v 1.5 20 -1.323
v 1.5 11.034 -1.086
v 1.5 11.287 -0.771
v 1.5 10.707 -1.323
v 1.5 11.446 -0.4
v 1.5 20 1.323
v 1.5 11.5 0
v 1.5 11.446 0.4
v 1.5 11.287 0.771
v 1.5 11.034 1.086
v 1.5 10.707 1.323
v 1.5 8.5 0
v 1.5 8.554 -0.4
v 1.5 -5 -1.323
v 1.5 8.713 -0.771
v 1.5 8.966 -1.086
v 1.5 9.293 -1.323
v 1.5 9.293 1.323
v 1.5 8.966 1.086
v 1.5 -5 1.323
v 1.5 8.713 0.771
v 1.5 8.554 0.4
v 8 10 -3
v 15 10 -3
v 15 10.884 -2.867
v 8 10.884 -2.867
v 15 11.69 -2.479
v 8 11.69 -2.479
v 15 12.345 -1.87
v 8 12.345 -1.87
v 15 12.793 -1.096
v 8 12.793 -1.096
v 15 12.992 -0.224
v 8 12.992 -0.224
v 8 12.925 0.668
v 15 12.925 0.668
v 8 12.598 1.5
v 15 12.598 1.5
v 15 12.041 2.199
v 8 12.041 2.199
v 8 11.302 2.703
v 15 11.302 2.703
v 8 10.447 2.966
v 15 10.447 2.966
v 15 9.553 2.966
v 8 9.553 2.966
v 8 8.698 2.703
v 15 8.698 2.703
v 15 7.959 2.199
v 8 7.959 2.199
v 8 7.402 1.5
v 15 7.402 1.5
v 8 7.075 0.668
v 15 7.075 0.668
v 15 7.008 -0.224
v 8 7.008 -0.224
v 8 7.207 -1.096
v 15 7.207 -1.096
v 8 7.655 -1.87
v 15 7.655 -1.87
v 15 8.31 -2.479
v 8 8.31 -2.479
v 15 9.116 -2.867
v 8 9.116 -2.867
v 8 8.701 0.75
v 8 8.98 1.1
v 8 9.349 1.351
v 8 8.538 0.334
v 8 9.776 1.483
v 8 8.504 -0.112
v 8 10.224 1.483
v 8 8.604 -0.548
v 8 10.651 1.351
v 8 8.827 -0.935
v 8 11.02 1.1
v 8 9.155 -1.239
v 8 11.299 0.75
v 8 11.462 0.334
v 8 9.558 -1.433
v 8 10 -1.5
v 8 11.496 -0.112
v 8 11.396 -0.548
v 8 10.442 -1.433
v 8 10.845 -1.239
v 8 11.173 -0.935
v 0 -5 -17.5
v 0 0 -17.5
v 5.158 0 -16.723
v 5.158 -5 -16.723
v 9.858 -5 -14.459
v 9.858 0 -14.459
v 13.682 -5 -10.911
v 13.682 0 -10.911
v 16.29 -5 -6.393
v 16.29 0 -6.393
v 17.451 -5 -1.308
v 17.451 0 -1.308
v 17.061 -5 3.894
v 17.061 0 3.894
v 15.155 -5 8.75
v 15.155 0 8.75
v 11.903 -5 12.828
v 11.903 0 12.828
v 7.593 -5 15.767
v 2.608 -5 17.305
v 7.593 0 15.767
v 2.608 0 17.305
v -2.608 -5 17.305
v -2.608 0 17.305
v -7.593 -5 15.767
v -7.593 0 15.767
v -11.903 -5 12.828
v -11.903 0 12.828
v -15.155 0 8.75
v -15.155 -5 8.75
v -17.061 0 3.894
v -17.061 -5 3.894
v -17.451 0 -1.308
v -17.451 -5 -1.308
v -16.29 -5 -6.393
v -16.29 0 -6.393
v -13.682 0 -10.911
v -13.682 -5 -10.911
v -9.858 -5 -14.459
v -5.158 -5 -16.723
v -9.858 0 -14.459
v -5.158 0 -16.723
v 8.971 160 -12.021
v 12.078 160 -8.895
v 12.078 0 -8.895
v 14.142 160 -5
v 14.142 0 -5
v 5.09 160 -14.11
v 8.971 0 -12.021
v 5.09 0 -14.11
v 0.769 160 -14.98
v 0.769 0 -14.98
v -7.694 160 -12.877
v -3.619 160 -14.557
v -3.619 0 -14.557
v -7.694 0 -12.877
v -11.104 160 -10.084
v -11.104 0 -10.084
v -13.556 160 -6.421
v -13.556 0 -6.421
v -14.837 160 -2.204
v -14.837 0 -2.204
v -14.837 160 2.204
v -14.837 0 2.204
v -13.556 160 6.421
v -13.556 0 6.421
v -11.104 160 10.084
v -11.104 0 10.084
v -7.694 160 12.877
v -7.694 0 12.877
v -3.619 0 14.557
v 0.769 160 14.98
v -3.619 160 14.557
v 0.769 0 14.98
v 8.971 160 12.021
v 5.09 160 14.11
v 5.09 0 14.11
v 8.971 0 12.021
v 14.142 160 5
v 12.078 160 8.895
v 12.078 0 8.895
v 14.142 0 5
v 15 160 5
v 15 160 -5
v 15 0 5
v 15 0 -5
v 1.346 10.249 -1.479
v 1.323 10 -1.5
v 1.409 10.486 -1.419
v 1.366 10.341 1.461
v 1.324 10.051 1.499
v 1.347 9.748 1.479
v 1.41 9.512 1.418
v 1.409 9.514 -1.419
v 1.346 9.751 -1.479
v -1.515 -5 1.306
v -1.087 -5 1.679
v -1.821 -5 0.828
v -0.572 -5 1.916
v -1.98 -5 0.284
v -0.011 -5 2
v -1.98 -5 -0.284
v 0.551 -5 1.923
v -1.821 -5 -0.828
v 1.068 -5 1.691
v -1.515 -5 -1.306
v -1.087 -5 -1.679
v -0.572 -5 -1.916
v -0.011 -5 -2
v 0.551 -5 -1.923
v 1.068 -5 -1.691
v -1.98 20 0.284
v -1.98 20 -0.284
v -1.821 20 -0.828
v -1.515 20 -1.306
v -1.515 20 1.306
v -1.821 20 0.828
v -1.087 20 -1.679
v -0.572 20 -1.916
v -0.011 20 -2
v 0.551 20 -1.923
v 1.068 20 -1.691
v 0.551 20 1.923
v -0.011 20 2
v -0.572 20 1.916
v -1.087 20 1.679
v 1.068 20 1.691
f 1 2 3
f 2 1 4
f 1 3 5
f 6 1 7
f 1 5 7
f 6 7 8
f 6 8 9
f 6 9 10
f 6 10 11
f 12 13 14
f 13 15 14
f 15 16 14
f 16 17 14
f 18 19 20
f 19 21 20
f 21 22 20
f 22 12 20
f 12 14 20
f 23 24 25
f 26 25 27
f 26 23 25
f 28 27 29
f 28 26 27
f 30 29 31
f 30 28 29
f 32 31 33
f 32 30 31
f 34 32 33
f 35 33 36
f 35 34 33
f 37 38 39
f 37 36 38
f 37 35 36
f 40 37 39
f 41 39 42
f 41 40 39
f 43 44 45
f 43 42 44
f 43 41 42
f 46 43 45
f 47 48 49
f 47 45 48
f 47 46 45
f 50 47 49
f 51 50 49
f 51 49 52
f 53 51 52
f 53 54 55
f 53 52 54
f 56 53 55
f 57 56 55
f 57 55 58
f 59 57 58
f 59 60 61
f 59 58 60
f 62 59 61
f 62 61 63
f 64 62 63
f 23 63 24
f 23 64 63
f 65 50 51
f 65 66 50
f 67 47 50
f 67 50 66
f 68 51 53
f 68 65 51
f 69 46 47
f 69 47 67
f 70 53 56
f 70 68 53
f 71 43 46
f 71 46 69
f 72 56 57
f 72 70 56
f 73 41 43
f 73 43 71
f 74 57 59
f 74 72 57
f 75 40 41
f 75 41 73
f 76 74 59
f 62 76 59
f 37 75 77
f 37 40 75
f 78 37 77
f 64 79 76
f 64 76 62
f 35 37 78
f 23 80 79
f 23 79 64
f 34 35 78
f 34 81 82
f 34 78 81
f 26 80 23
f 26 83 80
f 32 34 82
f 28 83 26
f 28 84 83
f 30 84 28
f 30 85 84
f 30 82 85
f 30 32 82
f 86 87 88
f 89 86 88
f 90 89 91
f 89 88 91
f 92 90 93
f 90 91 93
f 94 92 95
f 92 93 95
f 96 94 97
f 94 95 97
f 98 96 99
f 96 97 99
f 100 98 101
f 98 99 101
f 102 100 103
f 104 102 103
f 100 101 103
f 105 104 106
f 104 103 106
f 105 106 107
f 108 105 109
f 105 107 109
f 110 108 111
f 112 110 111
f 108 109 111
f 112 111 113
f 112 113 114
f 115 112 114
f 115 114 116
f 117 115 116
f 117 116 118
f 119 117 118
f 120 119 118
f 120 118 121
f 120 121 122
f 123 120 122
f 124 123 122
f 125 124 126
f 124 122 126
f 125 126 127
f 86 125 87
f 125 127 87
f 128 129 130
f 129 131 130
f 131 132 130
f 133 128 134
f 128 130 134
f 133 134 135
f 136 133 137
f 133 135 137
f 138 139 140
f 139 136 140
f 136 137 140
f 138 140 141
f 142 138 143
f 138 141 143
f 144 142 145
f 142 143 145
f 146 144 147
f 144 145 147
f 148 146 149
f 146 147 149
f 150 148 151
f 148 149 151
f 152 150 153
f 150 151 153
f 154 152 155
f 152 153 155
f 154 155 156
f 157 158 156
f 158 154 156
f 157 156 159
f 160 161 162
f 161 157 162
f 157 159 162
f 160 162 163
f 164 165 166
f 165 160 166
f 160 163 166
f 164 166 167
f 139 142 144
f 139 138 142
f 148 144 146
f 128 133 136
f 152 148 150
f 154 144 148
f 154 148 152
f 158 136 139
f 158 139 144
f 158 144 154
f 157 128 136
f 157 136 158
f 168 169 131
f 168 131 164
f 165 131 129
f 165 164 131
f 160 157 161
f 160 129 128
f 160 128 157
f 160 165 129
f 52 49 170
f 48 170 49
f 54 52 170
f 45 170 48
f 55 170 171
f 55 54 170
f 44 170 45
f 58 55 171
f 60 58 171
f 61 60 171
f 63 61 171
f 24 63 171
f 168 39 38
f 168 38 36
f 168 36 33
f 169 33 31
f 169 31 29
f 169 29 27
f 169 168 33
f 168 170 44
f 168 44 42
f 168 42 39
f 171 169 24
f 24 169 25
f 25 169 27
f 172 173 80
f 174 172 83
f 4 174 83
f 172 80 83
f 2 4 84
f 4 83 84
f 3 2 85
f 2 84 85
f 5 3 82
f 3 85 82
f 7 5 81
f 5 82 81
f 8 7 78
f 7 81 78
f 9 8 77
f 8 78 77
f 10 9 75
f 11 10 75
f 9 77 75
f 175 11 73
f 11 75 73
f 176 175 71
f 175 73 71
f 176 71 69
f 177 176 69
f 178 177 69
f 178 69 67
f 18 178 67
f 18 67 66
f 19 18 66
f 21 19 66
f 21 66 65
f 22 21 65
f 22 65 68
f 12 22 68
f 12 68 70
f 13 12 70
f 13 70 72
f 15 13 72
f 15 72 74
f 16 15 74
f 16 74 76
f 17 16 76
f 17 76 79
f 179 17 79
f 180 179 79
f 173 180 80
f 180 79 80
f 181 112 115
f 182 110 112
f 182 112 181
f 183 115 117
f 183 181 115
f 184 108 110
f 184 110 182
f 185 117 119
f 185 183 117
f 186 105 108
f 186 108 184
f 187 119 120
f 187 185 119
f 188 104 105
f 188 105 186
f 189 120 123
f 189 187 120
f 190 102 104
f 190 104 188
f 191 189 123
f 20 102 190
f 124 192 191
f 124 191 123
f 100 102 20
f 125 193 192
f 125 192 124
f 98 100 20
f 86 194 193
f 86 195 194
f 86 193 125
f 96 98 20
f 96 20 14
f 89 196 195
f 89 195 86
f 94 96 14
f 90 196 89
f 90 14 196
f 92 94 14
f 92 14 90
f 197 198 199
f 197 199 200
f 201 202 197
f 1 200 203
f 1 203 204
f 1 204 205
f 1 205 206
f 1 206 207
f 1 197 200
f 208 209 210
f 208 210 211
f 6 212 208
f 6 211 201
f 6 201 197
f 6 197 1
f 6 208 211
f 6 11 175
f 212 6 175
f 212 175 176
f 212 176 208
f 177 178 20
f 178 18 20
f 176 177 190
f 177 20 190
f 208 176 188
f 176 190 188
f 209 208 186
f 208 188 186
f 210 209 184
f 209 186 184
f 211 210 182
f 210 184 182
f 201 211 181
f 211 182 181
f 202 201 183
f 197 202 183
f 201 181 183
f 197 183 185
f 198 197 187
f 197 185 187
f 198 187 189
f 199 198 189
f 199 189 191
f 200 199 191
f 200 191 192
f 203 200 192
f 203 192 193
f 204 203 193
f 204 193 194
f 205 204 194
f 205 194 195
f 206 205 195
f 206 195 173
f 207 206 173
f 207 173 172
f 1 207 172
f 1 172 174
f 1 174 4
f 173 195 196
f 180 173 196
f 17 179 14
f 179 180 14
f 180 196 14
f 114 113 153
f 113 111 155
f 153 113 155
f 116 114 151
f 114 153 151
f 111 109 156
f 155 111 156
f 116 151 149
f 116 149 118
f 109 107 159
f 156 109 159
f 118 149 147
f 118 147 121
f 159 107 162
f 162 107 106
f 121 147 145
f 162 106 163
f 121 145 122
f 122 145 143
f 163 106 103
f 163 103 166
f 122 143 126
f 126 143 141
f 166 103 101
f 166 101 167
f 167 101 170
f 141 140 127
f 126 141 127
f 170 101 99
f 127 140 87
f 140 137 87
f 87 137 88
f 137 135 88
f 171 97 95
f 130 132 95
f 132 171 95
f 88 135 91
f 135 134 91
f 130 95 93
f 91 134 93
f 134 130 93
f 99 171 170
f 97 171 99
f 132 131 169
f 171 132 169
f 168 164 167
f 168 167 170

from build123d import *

# Parameters (mm, degrees)
SKETCH1_R           = 15
BOSS_EXTRUDE1_DEPTH = 160
SKETCH2_W           = 0.857864376
SKETCH2_H           = 10
BOSS_EXTRUDE2_DEPTH = 160
SKETCH6_R           = 17.5
BOSS_EXTRUDE4_DEPTH = 5
CUT_EXTRUDE1_DEPTH  = 25
SKETCH4_R           = 1.5
CUT_EXTRUDE2_DEPTH  = 15
CUT_EXTRUDE3_REACH  = 171.903
CUT_EXTRUDE3_START  = 8
SKETCH7_R           = 3


with BuildPart() as part:
    # Sketch1 → Boss-Extrude1 (new body)
    with BuildSketch(Plane(origin=(0, 0, 0), x_dir=(1, 0, 0), z_dir=(0, 1, 0))):
        with Locations(Location((0, 0, 0), (0, 0, 270))):
            Circle(SKETCH1_R)
    extrude(amount=BOSS_EXTRUDE1_DEPTH)

    # Sketch2 → Boss-Extrude2 (add)
    with BuildSketch(Plane(origin=(0, 160, 0), x_dir=(1, 0, 0), z_dir=(0, 1, 0))):
        with Locations((14.571067812, 0)):
            Rectangle(SKETCH2_W, SKETCH2_H)
    extrude(amount=-BOSS_EXTRUDE2_DEPTH)

    # Sketch6 → Boss-Extrude4 (add)
    with BuildSketch(Plane.XZ):
        with Locations(Location((0, 0, 0), (0, 0, 270))):
            Circle(SKETCH6_R)
    extrude(amount=BOSS_EXTRUDE4_DEPTH)

    # Sketch3 → Cut-Extrude1 (cut)
    with BuildSketch(Plane.XZ.offset(5)):
        with BuildLine():
            Line((1.5, -1.322875656), (1.5, 1.322875656))
            ThreePointArc((1.5, 1.322875656), (-2, 0), (1.5, -1.322875656))
        make_face()
    extrude(amount=-CUT_EXTRUDE1_DEPTH, mode=Mode.SUBTRACT)

    # Sketch4 → Cut-Extrude2 (cut)
    with BuildSketch(Plane(origin=(15, 0, 0), x_dir=(0, 0, -1), z_dir=(1, 0, 0))):
        with Locations((0, 10)):
            Circle(SKETCH4_R)
    extrude(amount=-CUT_EXTRUDE2_DEPTH, mode=Mode.SUBTRACT)

    # Sketch7 → Cut-Extrude3 (cut, up to next)
    with BuildSketch(Plane(origin=(0, 0, 0), x_dir=(0, 0, -1), z_dir=(1, 0, 0)).offset(CUT_EXTRUDE3_START), mode=Mode.PRIVATE) as cut_extrude3_sk1:
        with Locations((0, 10)):
            Circle(SKETCH7_R)
    cut_extrude3_tool1 = extrude(cut_extrude3_sk1.sketch, amount=CUT_EXTRUDE3_REACH, mode=Mode.PRIVATE) & part.part
    add(cut_extrude3_tool1.solids().sort_by_distance((8, 10, 0))[0], mode=Mode.SUBTRACT)


solid = part.part
